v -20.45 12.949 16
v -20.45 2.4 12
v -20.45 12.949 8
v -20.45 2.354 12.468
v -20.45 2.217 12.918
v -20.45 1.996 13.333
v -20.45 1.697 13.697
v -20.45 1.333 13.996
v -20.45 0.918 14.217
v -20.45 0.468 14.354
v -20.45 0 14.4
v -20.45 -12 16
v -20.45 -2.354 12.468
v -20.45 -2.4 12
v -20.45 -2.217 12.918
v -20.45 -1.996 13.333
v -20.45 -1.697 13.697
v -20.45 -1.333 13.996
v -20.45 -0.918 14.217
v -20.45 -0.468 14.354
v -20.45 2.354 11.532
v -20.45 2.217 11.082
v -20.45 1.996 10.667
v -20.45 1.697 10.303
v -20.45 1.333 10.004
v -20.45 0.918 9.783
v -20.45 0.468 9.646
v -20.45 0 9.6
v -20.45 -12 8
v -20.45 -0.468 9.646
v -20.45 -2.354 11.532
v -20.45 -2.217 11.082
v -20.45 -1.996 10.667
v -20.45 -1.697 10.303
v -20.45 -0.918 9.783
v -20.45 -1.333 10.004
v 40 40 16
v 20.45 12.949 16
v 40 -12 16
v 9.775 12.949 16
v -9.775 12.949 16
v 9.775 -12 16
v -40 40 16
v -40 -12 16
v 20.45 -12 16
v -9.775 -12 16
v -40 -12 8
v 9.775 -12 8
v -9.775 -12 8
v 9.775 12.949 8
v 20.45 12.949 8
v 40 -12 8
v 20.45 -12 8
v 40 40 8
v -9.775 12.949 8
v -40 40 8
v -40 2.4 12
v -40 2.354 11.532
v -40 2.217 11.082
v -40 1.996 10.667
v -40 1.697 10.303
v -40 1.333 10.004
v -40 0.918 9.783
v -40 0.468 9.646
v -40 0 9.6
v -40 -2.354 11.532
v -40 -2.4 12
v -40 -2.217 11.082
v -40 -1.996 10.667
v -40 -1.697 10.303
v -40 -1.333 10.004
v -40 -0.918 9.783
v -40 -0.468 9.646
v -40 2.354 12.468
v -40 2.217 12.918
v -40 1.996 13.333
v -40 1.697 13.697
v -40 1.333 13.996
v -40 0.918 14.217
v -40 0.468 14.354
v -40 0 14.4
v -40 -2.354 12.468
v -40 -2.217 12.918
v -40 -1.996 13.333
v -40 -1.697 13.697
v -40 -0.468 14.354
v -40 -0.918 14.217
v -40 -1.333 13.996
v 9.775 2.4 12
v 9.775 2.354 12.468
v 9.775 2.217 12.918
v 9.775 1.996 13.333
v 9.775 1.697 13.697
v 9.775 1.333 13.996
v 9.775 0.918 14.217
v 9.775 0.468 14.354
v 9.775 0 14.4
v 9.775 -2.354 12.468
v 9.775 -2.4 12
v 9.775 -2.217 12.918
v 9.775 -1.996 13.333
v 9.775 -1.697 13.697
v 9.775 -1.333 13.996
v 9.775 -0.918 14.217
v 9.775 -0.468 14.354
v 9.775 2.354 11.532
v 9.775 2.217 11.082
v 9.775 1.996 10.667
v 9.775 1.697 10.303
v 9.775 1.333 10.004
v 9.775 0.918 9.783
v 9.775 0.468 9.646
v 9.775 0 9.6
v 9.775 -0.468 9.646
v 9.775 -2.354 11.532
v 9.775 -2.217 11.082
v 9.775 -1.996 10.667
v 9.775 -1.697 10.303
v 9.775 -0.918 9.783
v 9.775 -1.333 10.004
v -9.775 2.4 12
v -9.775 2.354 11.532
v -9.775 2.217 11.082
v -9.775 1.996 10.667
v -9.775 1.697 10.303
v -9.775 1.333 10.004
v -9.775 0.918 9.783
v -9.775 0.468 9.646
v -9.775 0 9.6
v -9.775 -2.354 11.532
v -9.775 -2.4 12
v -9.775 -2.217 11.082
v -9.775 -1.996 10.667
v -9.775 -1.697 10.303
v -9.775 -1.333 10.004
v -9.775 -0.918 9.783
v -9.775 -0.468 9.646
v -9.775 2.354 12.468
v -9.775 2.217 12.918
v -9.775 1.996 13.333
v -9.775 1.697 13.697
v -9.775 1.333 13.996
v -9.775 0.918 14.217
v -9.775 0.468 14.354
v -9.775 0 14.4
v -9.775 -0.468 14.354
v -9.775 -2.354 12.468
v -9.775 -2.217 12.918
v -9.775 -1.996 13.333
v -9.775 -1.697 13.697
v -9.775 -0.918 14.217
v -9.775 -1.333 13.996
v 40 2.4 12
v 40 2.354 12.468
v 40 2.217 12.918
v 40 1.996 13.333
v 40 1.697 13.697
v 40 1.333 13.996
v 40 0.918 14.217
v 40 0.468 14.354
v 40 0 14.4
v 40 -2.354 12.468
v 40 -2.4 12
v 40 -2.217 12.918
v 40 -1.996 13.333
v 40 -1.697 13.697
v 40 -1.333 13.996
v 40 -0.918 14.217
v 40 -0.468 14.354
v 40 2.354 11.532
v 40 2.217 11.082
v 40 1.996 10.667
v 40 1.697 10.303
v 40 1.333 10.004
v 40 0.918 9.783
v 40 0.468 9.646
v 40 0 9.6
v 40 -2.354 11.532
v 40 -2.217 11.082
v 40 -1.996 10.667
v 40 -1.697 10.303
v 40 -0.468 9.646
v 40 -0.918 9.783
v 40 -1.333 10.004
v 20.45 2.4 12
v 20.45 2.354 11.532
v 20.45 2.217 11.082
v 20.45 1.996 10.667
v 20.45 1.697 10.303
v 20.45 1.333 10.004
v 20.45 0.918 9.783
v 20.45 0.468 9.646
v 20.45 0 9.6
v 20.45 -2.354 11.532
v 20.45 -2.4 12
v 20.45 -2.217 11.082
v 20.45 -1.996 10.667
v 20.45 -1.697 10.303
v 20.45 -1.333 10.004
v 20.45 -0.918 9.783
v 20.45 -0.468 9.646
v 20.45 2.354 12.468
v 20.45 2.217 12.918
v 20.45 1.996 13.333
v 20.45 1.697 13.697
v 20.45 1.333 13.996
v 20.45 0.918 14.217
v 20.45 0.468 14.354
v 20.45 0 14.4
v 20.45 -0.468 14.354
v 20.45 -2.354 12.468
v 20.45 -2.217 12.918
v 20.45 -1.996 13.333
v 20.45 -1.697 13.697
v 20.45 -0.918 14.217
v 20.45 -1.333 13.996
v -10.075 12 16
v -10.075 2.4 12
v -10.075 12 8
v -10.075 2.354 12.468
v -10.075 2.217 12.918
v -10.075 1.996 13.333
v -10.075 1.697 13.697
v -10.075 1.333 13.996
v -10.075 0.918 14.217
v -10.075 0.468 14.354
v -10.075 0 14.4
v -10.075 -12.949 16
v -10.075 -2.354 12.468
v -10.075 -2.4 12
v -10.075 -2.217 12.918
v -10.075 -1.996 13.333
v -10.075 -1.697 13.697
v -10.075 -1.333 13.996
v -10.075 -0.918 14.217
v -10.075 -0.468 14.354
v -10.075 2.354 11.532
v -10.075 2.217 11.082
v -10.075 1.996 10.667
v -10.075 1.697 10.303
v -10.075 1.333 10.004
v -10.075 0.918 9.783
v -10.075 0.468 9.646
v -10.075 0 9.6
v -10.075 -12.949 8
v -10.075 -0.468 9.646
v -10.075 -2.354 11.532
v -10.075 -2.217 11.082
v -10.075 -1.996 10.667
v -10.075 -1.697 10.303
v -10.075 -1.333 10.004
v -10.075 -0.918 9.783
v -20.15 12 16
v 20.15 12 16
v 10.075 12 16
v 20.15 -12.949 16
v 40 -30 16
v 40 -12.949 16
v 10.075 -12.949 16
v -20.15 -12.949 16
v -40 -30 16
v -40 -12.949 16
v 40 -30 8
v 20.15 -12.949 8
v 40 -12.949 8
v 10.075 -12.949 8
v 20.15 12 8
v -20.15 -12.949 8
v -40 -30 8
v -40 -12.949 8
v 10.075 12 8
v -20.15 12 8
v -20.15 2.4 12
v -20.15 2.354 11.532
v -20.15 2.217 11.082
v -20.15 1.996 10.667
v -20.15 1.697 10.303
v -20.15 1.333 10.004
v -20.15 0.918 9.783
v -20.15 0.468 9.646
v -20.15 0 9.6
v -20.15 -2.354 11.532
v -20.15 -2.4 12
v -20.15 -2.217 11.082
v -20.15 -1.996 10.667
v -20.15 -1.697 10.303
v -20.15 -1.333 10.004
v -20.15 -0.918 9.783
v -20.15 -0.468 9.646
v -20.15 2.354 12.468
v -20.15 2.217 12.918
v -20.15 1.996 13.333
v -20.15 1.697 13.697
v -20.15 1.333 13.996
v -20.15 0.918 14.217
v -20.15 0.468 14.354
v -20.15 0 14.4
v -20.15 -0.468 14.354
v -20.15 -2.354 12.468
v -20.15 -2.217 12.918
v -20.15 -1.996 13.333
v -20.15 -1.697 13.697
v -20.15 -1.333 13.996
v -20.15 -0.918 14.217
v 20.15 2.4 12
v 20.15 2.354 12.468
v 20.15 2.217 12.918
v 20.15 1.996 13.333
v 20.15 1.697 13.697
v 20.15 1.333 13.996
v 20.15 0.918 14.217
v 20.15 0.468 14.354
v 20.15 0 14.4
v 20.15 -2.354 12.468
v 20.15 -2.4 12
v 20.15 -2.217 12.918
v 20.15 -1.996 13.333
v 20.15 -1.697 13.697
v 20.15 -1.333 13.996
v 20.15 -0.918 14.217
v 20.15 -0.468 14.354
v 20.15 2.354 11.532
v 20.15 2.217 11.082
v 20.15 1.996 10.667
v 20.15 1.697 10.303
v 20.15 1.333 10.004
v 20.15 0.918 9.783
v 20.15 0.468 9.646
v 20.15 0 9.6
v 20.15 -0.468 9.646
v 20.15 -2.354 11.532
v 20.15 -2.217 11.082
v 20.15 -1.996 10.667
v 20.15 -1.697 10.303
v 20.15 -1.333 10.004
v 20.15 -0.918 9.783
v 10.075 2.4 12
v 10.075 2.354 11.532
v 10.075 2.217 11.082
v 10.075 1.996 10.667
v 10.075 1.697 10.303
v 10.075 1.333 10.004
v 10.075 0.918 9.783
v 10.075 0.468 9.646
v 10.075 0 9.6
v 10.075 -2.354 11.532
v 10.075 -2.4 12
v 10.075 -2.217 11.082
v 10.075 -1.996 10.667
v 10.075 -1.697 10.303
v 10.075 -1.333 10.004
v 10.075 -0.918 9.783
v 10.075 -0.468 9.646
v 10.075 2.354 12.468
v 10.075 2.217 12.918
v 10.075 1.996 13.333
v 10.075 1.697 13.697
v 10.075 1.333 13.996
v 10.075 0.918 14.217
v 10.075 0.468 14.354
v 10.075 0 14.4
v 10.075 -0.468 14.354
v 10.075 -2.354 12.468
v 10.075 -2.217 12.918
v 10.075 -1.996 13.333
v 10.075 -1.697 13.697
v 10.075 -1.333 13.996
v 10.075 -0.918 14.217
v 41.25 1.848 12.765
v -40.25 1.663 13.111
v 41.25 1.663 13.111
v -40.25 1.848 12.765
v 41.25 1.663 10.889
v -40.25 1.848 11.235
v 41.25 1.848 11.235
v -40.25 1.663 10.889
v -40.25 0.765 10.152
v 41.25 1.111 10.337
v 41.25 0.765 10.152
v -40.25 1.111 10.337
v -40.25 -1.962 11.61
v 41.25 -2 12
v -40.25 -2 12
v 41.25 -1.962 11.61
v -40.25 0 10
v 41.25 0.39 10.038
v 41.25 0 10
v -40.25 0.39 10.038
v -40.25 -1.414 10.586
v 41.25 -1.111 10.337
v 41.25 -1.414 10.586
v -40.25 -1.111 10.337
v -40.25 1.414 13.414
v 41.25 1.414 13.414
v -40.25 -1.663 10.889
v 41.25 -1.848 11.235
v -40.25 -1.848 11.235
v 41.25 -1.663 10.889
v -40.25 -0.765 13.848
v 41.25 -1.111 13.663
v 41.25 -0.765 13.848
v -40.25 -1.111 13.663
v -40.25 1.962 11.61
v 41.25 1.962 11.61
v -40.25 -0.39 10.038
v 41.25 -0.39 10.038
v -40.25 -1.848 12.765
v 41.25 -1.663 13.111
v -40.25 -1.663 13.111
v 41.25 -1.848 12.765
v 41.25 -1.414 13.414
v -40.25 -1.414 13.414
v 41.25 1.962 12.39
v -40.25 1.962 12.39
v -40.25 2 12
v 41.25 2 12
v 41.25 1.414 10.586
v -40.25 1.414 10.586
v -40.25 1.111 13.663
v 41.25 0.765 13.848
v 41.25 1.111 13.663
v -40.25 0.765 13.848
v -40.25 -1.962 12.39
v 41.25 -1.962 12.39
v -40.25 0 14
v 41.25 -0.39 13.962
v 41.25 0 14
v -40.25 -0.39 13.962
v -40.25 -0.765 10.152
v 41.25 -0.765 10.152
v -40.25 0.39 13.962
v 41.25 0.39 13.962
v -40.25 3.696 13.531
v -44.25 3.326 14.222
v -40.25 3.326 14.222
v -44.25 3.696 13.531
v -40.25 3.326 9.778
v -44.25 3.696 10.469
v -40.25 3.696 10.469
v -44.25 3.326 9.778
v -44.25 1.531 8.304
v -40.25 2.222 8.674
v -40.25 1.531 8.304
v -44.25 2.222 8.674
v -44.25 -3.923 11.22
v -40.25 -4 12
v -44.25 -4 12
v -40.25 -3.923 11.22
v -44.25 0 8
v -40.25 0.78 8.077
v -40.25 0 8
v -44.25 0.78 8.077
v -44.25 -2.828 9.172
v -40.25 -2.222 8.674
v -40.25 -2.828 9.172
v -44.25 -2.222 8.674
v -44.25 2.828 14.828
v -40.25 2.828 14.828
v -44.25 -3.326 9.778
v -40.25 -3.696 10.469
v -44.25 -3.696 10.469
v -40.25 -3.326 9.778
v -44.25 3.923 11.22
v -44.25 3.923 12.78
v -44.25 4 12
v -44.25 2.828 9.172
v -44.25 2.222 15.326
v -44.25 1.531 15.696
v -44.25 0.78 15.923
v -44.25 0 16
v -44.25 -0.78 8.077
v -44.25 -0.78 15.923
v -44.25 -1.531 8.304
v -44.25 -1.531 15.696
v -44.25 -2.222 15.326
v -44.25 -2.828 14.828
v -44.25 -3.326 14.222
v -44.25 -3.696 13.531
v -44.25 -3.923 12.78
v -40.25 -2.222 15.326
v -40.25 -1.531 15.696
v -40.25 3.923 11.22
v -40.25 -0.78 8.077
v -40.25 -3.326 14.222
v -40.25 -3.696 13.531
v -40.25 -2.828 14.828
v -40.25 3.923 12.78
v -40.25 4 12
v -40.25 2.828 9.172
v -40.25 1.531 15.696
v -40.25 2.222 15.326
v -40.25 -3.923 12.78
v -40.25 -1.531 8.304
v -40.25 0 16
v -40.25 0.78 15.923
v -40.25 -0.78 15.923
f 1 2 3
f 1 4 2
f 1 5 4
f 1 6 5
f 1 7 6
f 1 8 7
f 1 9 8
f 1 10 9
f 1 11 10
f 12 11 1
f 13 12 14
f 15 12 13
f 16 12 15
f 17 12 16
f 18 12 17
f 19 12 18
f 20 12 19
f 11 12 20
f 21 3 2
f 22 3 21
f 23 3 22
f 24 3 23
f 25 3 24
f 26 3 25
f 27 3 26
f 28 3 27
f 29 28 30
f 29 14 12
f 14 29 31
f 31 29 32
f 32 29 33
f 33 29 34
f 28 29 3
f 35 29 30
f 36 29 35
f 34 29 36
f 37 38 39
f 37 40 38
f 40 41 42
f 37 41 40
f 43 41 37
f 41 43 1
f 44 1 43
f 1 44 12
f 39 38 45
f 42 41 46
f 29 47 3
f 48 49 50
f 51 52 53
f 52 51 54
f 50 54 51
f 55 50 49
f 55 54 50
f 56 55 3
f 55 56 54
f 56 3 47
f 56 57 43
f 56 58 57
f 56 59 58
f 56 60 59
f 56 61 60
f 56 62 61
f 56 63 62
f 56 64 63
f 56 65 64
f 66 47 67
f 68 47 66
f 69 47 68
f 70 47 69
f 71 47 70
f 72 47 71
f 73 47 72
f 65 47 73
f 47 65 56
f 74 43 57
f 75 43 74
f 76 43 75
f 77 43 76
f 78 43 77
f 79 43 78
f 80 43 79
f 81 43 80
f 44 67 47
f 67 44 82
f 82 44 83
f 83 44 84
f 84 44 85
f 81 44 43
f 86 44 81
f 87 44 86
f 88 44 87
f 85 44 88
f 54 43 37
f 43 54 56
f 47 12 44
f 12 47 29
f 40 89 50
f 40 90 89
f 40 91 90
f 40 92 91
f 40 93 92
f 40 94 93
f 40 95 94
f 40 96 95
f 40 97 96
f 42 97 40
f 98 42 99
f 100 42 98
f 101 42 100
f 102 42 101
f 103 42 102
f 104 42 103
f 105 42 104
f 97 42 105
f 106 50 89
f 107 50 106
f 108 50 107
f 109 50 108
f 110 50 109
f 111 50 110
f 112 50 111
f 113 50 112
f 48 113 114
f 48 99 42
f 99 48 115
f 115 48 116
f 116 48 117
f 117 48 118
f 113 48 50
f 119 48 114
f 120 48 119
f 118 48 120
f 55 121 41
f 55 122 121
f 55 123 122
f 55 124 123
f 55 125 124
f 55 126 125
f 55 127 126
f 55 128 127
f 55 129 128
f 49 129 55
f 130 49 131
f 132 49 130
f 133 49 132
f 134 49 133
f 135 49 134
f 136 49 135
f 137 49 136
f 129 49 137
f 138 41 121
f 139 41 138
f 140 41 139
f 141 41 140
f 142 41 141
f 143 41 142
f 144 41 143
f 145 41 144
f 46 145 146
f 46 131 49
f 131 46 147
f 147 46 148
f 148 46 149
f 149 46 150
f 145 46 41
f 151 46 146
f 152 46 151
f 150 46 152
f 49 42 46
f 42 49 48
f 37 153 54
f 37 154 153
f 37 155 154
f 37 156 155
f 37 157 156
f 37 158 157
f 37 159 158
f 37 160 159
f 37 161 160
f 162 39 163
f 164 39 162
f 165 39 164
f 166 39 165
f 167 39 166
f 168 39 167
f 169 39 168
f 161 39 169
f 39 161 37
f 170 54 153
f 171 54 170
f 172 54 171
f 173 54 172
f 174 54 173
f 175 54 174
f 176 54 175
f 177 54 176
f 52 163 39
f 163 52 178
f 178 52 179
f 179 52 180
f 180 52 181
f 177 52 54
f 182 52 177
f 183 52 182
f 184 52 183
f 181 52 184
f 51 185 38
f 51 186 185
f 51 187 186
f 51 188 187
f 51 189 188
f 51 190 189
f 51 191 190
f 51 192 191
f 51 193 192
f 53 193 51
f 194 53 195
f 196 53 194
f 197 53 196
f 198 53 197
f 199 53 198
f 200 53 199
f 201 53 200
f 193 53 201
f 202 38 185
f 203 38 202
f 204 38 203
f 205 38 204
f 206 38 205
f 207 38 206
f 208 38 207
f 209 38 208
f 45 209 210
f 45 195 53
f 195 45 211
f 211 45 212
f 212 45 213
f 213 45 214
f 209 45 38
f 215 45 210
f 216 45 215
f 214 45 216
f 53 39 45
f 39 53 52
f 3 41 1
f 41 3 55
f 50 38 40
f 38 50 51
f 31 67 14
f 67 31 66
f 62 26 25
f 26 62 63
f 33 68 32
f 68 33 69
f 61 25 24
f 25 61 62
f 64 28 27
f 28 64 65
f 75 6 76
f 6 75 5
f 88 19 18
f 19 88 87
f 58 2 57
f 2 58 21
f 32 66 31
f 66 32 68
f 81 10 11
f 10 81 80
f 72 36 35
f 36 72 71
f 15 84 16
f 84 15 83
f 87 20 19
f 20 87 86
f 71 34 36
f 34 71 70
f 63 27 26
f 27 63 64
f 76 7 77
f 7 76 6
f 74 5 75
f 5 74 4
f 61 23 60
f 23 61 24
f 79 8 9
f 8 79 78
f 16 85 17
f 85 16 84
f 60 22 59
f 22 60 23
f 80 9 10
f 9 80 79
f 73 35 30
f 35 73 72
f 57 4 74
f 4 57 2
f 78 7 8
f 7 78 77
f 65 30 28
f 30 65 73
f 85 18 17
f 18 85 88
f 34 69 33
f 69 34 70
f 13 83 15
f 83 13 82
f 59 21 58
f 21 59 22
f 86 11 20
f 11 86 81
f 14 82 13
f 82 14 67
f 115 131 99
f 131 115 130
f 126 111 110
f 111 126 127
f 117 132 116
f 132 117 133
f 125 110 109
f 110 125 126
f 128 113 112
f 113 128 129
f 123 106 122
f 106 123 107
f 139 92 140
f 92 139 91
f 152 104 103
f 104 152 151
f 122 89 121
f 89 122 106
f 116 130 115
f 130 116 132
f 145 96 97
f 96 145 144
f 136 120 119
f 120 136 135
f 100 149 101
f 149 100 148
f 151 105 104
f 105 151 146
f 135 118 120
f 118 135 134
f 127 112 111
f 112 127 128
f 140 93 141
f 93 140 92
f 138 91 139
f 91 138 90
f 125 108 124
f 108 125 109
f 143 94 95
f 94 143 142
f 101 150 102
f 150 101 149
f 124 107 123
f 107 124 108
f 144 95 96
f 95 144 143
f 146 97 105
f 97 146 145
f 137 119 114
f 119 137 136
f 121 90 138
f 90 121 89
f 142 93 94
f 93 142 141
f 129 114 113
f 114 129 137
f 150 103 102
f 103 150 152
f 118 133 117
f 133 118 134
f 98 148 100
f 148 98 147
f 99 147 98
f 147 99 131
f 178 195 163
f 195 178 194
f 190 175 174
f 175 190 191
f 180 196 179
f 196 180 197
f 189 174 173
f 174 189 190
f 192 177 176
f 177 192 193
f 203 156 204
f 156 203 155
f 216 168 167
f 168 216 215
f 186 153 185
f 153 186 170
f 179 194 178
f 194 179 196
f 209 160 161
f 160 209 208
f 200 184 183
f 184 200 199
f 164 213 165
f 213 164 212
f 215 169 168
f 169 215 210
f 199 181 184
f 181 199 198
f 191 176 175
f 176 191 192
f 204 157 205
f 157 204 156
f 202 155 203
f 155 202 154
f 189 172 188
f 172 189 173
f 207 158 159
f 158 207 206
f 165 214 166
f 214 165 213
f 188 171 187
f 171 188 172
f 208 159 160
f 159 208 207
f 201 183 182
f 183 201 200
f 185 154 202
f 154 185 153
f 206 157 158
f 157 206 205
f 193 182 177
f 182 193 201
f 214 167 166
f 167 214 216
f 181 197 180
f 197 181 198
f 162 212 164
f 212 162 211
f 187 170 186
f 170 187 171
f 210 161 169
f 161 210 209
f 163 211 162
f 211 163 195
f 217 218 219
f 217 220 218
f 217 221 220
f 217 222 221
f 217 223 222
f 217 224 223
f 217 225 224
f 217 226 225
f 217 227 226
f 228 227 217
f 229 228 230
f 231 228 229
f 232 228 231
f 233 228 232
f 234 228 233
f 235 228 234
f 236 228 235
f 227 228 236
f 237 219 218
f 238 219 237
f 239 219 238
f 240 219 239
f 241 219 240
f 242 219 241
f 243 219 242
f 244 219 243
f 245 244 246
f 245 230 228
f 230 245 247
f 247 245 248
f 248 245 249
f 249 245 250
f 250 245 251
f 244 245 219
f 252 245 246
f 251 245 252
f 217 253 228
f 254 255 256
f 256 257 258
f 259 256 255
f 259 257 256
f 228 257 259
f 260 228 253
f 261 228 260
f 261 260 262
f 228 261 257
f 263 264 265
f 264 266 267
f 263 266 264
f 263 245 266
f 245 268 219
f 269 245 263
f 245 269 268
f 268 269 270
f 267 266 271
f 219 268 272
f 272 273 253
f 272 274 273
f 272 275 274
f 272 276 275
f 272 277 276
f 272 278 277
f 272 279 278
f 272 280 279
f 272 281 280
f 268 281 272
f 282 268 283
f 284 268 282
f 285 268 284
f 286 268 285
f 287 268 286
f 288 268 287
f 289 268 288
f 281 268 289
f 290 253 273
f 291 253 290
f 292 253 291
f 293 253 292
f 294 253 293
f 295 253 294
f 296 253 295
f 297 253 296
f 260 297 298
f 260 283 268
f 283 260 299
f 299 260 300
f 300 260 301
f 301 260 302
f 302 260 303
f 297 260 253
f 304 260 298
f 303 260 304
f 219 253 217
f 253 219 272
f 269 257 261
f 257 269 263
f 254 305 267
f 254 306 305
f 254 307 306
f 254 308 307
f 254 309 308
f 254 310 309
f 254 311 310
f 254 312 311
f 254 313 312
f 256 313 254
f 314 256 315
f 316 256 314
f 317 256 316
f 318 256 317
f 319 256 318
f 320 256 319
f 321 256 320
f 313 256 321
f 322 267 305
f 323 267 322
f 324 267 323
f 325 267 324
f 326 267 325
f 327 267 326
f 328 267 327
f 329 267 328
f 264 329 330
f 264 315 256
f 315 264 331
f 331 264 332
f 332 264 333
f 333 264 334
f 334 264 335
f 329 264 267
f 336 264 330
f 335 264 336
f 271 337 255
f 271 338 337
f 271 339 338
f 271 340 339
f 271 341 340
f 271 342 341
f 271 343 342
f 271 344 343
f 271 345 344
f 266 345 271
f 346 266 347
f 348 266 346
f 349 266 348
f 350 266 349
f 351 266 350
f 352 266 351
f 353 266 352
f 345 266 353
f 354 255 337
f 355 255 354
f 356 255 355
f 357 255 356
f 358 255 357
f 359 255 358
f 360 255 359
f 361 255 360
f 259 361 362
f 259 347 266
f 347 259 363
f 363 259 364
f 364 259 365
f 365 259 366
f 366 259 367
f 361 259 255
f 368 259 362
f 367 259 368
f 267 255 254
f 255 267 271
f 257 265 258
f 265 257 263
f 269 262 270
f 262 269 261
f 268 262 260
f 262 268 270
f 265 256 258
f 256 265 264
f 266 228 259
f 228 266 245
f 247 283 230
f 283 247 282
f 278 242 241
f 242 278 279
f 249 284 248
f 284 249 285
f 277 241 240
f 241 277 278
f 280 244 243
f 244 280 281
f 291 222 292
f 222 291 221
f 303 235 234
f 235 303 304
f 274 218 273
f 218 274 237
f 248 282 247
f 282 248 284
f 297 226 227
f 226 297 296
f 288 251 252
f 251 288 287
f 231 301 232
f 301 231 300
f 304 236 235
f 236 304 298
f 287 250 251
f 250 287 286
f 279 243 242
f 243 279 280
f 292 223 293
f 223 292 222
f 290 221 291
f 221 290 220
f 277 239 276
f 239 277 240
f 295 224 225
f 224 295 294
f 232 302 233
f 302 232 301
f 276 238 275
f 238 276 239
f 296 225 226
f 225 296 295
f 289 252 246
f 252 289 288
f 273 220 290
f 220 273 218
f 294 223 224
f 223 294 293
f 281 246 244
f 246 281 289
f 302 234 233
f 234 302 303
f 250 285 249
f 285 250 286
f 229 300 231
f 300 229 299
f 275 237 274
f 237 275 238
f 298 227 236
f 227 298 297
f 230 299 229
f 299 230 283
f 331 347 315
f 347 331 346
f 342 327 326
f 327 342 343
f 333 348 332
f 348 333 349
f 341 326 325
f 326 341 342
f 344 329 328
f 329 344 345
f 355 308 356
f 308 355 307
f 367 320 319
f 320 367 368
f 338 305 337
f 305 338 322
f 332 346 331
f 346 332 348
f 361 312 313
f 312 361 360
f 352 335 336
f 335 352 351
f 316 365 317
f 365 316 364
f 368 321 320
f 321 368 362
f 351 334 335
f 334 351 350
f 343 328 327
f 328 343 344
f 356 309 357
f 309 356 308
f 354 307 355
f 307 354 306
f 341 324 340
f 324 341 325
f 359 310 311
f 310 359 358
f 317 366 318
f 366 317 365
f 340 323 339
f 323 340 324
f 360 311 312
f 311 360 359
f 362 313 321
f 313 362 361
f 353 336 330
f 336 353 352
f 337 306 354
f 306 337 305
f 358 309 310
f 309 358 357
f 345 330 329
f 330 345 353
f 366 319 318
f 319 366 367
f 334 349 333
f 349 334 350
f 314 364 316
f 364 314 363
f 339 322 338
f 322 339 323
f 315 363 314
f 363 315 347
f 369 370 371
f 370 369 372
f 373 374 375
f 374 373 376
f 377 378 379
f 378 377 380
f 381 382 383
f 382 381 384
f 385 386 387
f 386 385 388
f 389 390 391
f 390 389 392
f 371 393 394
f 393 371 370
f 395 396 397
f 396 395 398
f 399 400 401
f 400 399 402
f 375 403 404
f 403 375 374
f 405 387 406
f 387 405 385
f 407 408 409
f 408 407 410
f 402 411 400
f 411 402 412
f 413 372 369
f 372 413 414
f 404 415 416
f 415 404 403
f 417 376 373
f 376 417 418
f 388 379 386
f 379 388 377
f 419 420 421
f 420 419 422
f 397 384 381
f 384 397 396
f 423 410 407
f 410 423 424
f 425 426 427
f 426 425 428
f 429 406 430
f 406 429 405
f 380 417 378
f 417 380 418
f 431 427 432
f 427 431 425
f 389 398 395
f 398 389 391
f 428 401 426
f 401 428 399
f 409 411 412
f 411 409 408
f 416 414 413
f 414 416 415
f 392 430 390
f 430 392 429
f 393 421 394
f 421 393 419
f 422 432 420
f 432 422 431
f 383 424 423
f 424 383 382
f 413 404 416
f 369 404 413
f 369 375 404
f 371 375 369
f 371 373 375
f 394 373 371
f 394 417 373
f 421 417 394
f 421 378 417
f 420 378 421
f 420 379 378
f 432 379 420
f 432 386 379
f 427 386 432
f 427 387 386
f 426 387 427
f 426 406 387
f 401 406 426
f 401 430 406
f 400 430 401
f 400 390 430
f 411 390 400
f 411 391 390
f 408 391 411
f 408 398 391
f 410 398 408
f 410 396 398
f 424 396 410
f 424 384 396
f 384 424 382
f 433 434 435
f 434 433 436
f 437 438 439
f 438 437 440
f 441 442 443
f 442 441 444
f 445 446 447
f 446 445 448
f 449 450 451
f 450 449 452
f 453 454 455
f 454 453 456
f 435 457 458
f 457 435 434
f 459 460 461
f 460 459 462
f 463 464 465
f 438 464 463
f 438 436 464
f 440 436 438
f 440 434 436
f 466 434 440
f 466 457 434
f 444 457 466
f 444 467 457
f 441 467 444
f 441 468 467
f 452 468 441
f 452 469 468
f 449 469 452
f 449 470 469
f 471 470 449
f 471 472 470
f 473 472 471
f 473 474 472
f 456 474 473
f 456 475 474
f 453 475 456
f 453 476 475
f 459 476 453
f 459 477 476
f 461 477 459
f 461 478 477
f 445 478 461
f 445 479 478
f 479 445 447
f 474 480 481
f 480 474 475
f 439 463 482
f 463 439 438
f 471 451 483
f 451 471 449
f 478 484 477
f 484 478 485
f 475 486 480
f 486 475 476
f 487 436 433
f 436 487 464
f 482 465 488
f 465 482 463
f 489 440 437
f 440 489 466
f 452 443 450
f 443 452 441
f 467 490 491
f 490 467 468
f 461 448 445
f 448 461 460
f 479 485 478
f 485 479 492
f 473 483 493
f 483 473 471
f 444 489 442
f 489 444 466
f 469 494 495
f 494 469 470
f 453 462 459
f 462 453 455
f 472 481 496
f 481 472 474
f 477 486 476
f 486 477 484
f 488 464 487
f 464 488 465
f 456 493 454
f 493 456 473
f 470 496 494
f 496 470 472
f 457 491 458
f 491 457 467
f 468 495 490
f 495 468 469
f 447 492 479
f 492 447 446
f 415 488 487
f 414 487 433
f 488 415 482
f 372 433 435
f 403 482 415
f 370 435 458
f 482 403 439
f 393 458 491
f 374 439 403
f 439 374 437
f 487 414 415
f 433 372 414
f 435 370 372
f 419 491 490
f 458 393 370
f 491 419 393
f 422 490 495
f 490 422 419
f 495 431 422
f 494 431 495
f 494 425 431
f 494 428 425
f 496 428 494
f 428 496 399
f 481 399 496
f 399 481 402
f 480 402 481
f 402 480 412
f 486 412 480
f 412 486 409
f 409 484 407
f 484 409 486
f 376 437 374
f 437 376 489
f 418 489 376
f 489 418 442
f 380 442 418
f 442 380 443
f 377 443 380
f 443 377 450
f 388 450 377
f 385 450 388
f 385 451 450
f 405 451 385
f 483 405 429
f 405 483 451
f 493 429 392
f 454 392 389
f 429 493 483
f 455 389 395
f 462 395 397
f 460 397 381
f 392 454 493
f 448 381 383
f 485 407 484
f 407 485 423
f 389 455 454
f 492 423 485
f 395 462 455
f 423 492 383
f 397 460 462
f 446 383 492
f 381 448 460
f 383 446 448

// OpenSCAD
$fn = 32;

// ------------------------------------------------------------------------
// Butt hinge: hinge 80 mm, leaf swung 0 deg
// Every part is its own module, assembly() places every instance.
// ------------------------------------------------------------------------

// --- part 1 ---
module hinge_base() {
  difference() {
    union() {
      translate([-40, -12, -4]) cube([19.55, 52, 8]);
      translate([-9.775, -12, -4]) cube([19.55, 52, 8]);
      translate([20.45, -12, -4]) cube([19.55, 52, 8]);
      translate([-40, 12.949, -4]) cube([80, 27.051, 8]);
    }
    translate([-30.225, 0, 0]) rotate([0, 90, 0]) cylinder(h = 21.55, d = 4.8, center = true);
    translate([0, 0, 0]) rotate([0, 90, 0]) cylinder(h = 21.55, d = 4.8, center = true);
    translate([30.225, 0, 0]) rotate([0, 90, 0]) cylinder(h = 21.55, d = 4.8, center = true);
  }
}

// --- part 2 ---
module hinge_mover() {
  difference() {
    union() {
      translate([-20.15, -30, -4]) cube([10.075, 42, 8]);
      translate([10.075, -30, -4]) cube([10.075, 42, 8]);
      translate([-40, -30, -4]) cube([80, 17.051, 8]);
    }
    translate([-15.113, 0, 0]) rotate([0, 90, 0]) cylinder(h = 12.075, d = 4.8, center = true);
    translate([15.113, 0, 0]) rotate([0, 90, 0]) cylinder(h = 12.075, d = 4.8, center = true);
  }
}

// --- part 3 ---
module hinge_pin() {
  rotate([0, 90, 0]) cylinder(h = 82.5, d = 4, center = true);
  translate([-44.25, 0, 0]) rotate([0, 90, 0]) cylinder(h = 4, d = 8);
}

// --- assembly ---
module assembly() {
  color([0.80, 0.24, 0.20]) translate([0, 0, 12]) rotate([0, 0, 0]) hinge_base();
  color([0.20, 0.45, 0.75]) translate([0, 0, 12]) rotate([0, 0, 0]) hinge_mover();
  color([0.25, 0.62, 0.32]) translate([0, 0, 12]) rotate([0, 0, 0]) hinge_pin();
}

assembly();
